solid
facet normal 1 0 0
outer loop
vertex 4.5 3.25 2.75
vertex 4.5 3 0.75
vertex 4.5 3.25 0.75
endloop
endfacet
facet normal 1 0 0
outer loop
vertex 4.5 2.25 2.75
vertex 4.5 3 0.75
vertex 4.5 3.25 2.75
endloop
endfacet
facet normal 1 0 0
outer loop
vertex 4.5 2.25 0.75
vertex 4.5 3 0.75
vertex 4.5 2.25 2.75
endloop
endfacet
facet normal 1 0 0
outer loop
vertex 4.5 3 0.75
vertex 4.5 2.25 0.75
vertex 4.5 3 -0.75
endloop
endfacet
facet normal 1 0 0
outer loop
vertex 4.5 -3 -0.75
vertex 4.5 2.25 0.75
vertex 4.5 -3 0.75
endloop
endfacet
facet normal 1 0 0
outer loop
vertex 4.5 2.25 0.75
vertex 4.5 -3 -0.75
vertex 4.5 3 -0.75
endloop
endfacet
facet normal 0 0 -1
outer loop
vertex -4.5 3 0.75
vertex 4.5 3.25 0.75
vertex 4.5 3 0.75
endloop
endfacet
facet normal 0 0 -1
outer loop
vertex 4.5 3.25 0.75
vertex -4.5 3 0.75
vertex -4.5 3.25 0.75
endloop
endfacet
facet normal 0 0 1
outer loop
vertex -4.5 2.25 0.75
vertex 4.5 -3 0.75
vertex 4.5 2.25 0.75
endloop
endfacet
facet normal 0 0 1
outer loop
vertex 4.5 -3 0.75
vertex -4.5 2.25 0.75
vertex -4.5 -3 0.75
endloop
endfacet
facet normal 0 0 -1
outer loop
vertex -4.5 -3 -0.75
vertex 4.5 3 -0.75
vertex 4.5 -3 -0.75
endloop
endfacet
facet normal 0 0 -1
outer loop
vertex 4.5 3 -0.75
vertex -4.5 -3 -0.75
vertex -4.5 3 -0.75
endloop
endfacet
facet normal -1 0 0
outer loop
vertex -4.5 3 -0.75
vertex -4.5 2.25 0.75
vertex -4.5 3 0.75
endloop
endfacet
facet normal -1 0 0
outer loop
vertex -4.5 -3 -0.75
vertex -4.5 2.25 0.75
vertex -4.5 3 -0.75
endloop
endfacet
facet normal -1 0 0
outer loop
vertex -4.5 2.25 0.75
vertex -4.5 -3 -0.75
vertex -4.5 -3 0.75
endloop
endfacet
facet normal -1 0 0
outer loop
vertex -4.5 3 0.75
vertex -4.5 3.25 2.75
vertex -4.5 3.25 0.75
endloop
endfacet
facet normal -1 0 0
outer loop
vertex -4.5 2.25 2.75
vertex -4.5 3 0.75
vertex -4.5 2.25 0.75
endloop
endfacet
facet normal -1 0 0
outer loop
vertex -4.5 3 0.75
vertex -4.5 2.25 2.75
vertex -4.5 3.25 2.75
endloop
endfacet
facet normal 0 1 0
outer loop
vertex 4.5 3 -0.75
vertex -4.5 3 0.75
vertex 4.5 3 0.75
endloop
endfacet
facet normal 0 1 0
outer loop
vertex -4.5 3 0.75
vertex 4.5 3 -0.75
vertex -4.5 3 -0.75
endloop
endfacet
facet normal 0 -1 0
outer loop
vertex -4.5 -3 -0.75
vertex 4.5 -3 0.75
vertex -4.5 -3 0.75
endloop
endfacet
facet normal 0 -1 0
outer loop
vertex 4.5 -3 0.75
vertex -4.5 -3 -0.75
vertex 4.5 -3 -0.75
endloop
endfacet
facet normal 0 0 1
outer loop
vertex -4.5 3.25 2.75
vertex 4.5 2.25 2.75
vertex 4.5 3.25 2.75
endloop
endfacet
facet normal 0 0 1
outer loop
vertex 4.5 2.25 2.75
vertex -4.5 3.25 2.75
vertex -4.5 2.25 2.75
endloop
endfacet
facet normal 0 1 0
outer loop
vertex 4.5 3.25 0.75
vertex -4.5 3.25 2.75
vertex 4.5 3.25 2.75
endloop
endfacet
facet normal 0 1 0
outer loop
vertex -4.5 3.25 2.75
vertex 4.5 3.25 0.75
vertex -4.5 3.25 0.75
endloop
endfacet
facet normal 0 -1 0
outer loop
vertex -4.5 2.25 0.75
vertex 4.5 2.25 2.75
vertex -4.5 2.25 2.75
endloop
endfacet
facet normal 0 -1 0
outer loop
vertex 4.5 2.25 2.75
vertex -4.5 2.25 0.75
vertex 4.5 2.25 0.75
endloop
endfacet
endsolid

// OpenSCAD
// ==========================================
// Xentient Interior — Rail Guide Strips
// Glue onto inner hex wall at each vertex
// Plates slide into the channel these create
// ==========================================
// Print count: 6 (one per hex vertex)
// Glue position: inner wall at 0°, 60°, 120°, 180°, 240°, 300°
// Glue zone: Z=3 to Z=12 (collar only, where wall ≥ 3mm)
// Adhesive: cyanoacrylate on flat back, scuff wall first
// Per Framework §7: 3.5mm wide × 2mm deep rail slots
// Units: mm

$fn = 32;

Rail_W      = 3.5;     // Rail channel width
Rail_H      = 2.0;     // Rail protrusion height (creates groove between pair)
Rail_Length = 9.0;     // Z=3 to Z=12 = 9mm
Rail_Base_T = 1.5;     // Base strip thickness (glue surface)
Rail_Base_W = 6.0;     // Base strip width (wider than rail for glue area)

module rail_guide_strip() {
    // Flat base strip (glue surface against inner wall)
    cube([Rail_Length, Rail_Base_W, Rail_Base_T], center=true);

    // Raised rail ridge (one side of the channel)
    // Two strips placed 3.5mm apart create a groove for plate edge
    translate([0, Rail_W/2 + 1.0, Rail_Base_T/2 + Rail_H/2])
        cube([Rail_Length, 1.0, Rail_H], center=true);
}

// Render single strip (print 6)
rail_guide_strip();
